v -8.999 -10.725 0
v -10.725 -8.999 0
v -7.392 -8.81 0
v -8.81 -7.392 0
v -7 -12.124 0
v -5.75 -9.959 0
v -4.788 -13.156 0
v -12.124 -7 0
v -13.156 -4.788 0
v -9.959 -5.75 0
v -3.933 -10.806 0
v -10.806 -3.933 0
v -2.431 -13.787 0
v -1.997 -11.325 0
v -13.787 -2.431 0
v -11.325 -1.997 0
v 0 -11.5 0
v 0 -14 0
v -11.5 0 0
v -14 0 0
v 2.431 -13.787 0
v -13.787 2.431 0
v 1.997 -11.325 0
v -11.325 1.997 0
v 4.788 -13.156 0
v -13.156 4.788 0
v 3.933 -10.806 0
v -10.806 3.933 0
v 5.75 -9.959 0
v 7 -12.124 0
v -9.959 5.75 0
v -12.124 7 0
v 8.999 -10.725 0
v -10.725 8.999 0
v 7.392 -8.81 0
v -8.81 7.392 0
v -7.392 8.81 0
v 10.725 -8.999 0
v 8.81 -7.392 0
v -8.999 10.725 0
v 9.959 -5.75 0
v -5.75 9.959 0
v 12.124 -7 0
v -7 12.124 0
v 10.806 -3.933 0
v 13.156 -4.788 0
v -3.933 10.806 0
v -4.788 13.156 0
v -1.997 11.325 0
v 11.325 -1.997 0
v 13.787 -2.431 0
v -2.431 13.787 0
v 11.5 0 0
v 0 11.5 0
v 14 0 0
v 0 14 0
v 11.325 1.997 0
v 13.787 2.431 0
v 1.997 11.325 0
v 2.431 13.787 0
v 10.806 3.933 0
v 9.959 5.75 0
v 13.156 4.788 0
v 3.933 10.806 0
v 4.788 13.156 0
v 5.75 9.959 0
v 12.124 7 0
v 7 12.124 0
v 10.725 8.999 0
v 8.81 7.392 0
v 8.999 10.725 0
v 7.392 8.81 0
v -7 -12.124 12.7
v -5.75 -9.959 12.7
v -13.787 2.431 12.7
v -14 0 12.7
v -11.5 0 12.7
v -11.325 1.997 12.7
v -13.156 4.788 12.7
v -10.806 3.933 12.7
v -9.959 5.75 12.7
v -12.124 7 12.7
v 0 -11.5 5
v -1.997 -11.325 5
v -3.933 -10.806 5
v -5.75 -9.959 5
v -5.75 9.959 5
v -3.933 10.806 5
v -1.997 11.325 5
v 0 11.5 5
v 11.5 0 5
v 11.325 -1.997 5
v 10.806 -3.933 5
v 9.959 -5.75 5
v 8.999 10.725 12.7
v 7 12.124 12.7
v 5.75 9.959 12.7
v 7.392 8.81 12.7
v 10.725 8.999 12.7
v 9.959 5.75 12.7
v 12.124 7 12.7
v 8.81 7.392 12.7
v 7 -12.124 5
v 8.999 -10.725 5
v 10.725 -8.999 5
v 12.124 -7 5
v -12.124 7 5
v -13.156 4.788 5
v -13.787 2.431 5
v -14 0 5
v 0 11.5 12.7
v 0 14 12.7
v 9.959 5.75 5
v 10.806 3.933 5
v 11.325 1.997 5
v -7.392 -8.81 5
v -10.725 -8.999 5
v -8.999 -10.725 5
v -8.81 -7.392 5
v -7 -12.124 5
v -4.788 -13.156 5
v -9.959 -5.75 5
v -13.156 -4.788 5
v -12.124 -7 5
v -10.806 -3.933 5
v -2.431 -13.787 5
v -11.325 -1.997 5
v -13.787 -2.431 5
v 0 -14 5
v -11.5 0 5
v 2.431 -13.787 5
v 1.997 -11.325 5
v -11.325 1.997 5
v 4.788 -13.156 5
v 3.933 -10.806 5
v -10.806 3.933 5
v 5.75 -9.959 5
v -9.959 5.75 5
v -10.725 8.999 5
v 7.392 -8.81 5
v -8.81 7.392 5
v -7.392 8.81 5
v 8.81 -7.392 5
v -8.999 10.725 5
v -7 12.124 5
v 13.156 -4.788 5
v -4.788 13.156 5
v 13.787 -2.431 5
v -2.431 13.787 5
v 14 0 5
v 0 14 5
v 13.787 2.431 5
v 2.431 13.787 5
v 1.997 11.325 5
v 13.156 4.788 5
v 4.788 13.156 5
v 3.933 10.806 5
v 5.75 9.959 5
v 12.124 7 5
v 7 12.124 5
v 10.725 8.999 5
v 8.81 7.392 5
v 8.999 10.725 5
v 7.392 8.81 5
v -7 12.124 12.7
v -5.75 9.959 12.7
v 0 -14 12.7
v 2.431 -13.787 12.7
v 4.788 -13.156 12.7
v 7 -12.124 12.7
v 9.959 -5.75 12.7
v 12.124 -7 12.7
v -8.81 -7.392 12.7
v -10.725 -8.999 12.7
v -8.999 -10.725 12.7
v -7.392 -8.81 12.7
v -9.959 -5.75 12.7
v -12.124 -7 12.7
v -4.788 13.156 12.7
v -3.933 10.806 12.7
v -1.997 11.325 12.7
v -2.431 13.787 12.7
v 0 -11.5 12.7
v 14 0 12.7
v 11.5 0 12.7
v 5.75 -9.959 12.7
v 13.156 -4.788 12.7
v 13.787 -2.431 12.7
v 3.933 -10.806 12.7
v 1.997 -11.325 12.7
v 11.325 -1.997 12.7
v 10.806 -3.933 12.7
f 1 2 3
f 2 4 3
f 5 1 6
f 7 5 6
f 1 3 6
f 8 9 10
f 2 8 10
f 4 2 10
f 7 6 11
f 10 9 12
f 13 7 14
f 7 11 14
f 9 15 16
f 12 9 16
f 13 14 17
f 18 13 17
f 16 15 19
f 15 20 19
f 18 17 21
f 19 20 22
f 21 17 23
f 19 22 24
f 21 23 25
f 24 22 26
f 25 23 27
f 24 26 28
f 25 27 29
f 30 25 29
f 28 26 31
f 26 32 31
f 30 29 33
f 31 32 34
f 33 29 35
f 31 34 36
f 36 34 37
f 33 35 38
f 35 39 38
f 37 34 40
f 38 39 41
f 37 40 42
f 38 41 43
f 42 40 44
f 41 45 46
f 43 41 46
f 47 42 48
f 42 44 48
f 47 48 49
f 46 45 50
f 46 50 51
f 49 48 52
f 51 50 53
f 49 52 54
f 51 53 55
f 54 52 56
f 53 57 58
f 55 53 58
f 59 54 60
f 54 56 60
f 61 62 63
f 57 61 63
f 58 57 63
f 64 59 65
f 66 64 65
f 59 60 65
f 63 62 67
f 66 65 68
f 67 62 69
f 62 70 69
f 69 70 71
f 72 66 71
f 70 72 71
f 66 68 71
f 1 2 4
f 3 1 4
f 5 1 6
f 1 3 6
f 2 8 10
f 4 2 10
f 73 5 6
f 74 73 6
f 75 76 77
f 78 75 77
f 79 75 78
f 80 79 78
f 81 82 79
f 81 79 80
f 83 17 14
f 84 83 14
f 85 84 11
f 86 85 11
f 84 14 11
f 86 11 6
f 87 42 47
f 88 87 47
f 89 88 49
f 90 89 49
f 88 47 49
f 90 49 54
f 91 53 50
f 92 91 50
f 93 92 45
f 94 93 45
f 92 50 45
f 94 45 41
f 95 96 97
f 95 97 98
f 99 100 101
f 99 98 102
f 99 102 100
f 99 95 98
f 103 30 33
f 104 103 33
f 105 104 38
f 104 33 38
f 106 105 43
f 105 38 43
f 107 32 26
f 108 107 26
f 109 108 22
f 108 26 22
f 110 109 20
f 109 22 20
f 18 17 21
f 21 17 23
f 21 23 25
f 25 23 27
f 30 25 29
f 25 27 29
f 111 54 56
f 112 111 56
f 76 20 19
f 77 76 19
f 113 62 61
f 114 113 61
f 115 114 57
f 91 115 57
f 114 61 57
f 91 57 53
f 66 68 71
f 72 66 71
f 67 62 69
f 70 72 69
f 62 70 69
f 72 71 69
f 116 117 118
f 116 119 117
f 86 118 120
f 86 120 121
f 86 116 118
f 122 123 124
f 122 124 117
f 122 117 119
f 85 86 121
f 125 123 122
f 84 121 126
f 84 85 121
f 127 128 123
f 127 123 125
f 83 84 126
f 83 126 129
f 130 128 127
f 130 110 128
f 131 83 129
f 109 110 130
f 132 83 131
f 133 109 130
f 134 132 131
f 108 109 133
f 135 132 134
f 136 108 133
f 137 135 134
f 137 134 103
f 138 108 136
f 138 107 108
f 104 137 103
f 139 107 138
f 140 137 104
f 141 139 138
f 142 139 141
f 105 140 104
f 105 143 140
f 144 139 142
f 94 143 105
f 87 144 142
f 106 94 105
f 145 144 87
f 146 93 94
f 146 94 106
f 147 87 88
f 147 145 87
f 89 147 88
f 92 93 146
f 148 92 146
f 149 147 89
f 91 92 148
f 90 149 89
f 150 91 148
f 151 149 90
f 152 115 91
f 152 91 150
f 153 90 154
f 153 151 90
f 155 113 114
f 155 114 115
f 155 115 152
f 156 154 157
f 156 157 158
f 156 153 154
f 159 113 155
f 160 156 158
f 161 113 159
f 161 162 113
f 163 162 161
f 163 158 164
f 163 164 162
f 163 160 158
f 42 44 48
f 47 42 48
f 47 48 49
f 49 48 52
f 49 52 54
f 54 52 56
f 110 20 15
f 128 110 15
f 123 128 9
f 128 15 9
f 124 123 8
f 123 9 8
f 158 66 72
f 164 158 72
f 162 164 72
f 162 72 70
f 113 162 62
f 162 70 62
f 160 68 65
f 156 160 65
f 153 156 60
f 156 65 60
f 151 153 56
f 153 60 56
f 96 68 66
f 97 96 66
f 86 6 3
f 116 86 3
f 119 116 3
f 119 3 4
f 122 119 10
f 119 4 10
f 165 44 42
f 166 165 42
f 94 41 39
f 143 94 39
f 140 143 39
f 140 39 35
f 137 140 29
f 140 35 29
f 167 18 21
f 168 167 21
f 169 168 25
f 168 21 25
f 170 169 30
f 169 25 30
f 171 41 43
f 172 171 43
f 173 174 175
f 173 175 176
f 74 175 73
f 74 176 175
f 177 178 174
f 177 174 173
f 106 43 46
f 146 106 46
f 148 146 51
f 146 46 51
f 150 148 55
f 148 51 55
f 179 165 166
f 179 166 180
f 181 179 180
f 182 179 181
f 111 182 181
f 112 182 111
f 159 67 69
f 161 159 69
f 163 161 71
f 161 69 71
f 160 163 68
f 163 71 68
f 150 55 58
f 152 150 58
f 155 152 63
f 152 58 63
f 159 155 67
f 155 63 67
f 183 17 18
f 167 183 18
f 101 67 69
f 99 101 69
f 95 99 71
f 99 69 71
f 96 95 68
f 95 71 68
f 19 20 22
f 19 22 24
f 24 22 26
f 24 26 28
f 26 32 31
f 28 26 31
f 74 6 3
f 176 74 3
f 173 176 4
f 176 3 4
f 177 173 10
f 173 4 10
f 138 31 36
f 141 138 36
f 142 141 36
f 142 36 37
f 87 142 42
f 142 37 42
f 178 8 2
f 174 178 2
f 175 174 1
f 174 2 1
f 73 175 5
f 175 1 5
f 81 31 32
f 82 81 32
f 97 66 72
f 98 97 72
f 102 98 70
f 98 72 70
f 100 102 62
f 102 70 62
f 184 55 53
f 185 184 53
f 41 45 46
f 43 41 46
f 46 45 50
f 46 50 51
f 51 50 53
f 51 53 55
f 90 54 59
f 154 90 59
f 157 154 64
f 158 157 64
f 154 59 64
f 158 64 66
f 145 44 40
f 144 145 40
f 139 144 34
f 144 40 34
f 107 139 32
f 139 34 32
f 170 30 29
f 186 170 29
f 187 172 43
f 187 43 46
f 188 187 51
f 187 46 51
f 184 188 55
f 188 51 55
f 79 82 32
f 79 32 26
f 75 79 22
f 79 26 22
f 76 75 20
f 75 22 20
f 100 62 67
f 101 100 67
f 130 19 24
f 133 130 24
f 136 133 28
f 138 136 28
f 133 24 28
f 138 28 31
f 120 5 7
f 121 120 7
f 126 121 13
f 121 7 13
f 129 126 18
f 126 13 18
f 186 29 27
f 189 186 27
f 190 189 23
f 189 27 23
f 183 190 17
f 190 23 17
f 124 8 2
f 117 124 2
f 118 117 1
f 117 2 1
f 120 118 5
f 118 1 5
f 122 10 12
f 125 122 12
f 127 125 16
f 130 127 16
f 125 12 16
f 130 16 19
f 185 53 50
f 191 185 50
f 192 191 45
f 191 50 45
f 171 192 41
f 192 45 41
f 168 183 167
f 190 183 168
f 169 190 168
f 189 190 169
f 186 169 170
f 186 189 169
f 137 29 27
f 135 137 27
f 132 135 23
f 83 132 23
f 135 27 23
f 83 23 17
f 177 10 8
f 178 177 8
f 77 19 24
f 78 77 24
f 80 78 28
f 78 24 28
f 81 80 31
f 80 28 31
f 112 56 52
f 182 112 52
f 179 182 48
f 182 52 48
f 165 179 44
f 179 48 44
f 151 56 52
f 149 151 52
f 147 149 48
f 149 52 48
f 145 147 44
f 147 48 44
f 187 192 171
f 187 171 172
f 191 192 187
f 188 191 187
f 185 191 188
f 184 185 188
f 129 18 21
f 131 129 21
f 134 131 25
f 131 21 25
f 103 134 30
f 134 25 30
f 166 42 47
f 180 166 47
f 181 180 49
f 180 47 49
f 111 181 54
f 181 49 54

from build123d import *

# Parameters (mm, degrees)
F1_DEPTH = 12.7
F2_DEPTH = 5


with BuildPart() as f1:
    # F0 (on Top) → F1 (new body)
    with BuildSketch(Plane.XY):
        with BuildLine():
            Line((0, 11.5), (0, 14))
            ThreePointArc((0, 14), (-3.6234666314, 13.522961568), (-7, 12.124355653))
            Line((-7, 12.124355653), (-5.75, 9.9592921435))
            ThreePointArc((-5.75, 9.9592921435), (-2.9764190187, 11.1081470023), (0, 11.5))
        make_face()
    extrude(amount=F1_DEPTH)


with BuildPart() as f1b:
    # F0 (on Top) → F1, piece 2 (new body)
    with BuildSketch(Plane.XY):
        with BuildLine():
            Line((-14, 0), (-11.5, 0))
            ThreePointArc((-11.5, 0), (-11.1081470023, 2.9764190187), (-9.9592921435, 5.75))
            Line((-9.9592921435, 5.75), (-12.124355653, 7))
            ThreePointArc((-12.124355653, 7), (-13.522961568, 3.6234666314), (-14, 0))
        make_face()
    extrude(amount=F1_DEPTH)


with BuildPart() as f1c:
    # F0 (on Top) → F1, piece 3 (new body)
    with BuildSketch(Plane.XY):
        with BuildLine():
            Line((9.9592921435, 5.75), (12.124355653, 7))
            ThreePointArc((12.124355653, 7), (9.8994949366, 9.8994949366), (7, 12.124355653))
            Line((7, 12.124355653), (5.75, 9.9592921435))
            ThreePointArc((5.75, 9.9592921435), (8.1317279836, 8.1317279836), (9.9592921435, 5.75))
        make_face()
    extrude(amount=F1_DEPTH)


with BuildPart() as f1d:
    # F0 (on Top) → F1, piece 4 (new body)
    with BuildSketch(Plane.XY):
        with BuildLine():
            ThreePointArc((12.124355653, -7), (13.522961568, -3.6234666314), (14, 0))
            Line((14, 0), (11.5, 0))
            ThreePointArc((11.5, 0), (11.1081470023, -2.9764190187), (9.9592921435, -5.75))
            Line((9.9592921435, -5.75), (12.124355653, -7))
        make_face()
    extrude(amount=F1_DEPTH)


with BuildPart() as f1e:
    # F0 (on Top) → F1, piece 5 (new body)
    with BuildSketch(Plane.XY):
        with BuildLine():
            ThreePointArc((0, -14), (3.6234666314, -13.522961568), (7, -12.124355653))
            Line((7, -12.124355653), (5.75, -9.9592921435))
            ThreePointArc((5.75, -9.9592921435), (2.9764190187, -11.1081470023), (0, -11.5))
            Line((0, -11.5), (0, -14))
        make_face()
    extrude(amount=F1_DEPTH)


with BuildPart() as f1f:
    # F0 (on Top) → F1, piece 6 (new body)
    with BuildSketch(Plane.XY):
        with BuildLine():
            ThreePointArc((-5.75, -9.9592921435), (-8.1317279836, -8.1317279836), (-9.9592921435, -5.75))
            Line((-9.9592921435, -5.75), (-12.124355653, -7))
            ThreePointArc((-12.124355653, -7), (-9.8994949366, -9.8994949366), (-7, -12.124355653))
            Line((-7, -12.124355653), (-5.75, -9.9592921435))
        make_face()
    extrude(amount=F1_DEPTH)


with BuildPart() as f2:
    # F0 (on Top) → F2 (new body)
    with BuildSketch(Plane.XY):
        with BuildLine():
            Line((11.5, 0), (14, 0))
            ThreePointArc((14, 0), (13.522961568, 3.6234666314), (12.124355653, 7))
            Line((12.124355653, 7), (9.9592921435, 5.75))
            ThreePointArc((9.9592921435, 5.75), (11.1081470023, 2.9764190187), (11.5, 0))
        make_face()
        with BuildLine():
            ThreePointArc((12.124355653, -7), (13.522961568, -3.6234666314), (14, 0))
            Line((14, 0), (11.5, 0))
            ThreePointArc((11.5, 0), (11.1081470023, -2.9764190187), (9.9592921435, -5.75))
            Line((9.9592921435, -5.75), (12.124355653, -7))
        make_face()
        with BuildLine():
            Line((9.9592921435, 5.75), (12.124355653, 7))
            ThreePointArc((12.124355653, 7), (9.8994949366, 9.8994949366), (7, 12.124355653))
            Line((7, 12.124355653), (5.75, 9.9592921435))
            ThreePointArc((5.75, 9.9592921435), (8.1317279836, 8.1317279836), (9.9592921435, 5.75))
        make_face()
        with BuildLine():
            ThreePointArc((7, -12.124355653), (9.8994949366, -9.8994949366), (12.124355653, -7))
            Line((12.124355653, -7), (9.9592921435, -5.75))
            ThreePointArc((9.9592921435, -5.75), (8.1317279836, -8.1317279836), (5.75, -9.9592921435))
            Line((5.75, -9.9592921435), (7, -12.124355653))
        make_face()
        with BuildLine():
            Line((5.75, 9.9592921435), (7, 12.124355653))
            ThreePointArc((7, 12.124355653), (3.6234666314, 13.522961568), (0, 14))
            Line((0, 14), (0, 11.5))
            ThreePointArc((0, 11.5), (2.9764190187, 11.1081470023), (5.75, 9.9592921435))
        make_face()
        with BuildLine():
            ThreePointArc((0, -14), (3.6234666314, -13.522961568), (7, -12.124355653))
            Line((7, -12.124355653), (5.75, -9.9592921435))
            ThreePointArc((5.75, -9.9592921435), (2.9764190187, -11.1081470023), (0, -11.5))
            Line((0, -11.5), (0, -14))
        make_face()
        with BuildLine():
            Line((0, 11.5), (0, 14))
            ThreePointArc((0, 14), (-3.6234666314, 13.522961568), (-7, 12.124355653))
            Line((-7, 12.124355653), (-5.75, 9.9592921435))
            ThreePointArc((-5.75, 9.9592921435), (-2.9764190187, 11.1081470023), (0, 11.5))
        make_face()
        with BuildLine():
            ThreePointArc((-7, -12.124355653), (-3.6234666314, -13.522961568), (0, -14))
            Line((0, -14), (0, -11.5))
            ThreePointArc((0, -11.5), (-2.9764190187, -11.1081470023), (-5.75, -9.9592921435))
            Line((-5.75, -9.9592921435), (-7, -12.124355653))
        make_face()
        with BuildLine():
            ThreePointArc((-9.9592921435, -5.75), (-11.1081470023, -2.9764190187), (-11.5, 0))
            Line((-11.5, 0), (-14, 0))
            ThreePointArc((-14, 0), (-13.522961568, -3.6234666314), (-12.124355653, -7))
            Line((-12.124355653, -7), (-9.9592921435, -5.75))
        make_face()
        with BuildLine():
            Line((-14, 0), (-11.5, 0))
            ThreePointArc((-11.5, 0), (-11.1081470023, 2.9764190187), (-9.9592921435, 5.75))
            Line((-9.9592921435, 5.75), (-12.124355653, 7))
            ThreePointArc((-12.124355653, 7), (-13.522961568, 3.6234666314), (-14, 0))
        make_face()
        with BuildLine():
            ThreePointArc((-9.9592921435, 5.75), (-8.1317279836, 8.1317279836), (-5.75, 9.9592921435))
            Line((-5.75, 9.9592921435), (-7, 12.124355653))
            ThreePointArc((-7, 12.124355653), (-9.8994949366, 9.8994949366), (-12.124355653, 7))
            Line((-12.124355653, 7), (-9.9592921435, 5.75))
        make_face()
        with BuildLine():
            ThreePointArc((-5.75, -9.9592921435), (-8.1317279836, -8.1317279836), (-9.9592921435, -5.75))
            Line((-9.9592921435, -5.75), (-12.124355653, -7))
            ThreePointArc((-12.124355653, -7), (-9.8994949366, -9.8994949366), (-7, -12.124355653))
            Line((-7, -12.124355653), (-5.75, -9.9592921435))
        make_face()
    extrude(amount=F2_DEPTH)


solid = Compound([f1.part, f1b.part, f1c.part, f1d.part, f1e.part, f1f.part, f2.part])
